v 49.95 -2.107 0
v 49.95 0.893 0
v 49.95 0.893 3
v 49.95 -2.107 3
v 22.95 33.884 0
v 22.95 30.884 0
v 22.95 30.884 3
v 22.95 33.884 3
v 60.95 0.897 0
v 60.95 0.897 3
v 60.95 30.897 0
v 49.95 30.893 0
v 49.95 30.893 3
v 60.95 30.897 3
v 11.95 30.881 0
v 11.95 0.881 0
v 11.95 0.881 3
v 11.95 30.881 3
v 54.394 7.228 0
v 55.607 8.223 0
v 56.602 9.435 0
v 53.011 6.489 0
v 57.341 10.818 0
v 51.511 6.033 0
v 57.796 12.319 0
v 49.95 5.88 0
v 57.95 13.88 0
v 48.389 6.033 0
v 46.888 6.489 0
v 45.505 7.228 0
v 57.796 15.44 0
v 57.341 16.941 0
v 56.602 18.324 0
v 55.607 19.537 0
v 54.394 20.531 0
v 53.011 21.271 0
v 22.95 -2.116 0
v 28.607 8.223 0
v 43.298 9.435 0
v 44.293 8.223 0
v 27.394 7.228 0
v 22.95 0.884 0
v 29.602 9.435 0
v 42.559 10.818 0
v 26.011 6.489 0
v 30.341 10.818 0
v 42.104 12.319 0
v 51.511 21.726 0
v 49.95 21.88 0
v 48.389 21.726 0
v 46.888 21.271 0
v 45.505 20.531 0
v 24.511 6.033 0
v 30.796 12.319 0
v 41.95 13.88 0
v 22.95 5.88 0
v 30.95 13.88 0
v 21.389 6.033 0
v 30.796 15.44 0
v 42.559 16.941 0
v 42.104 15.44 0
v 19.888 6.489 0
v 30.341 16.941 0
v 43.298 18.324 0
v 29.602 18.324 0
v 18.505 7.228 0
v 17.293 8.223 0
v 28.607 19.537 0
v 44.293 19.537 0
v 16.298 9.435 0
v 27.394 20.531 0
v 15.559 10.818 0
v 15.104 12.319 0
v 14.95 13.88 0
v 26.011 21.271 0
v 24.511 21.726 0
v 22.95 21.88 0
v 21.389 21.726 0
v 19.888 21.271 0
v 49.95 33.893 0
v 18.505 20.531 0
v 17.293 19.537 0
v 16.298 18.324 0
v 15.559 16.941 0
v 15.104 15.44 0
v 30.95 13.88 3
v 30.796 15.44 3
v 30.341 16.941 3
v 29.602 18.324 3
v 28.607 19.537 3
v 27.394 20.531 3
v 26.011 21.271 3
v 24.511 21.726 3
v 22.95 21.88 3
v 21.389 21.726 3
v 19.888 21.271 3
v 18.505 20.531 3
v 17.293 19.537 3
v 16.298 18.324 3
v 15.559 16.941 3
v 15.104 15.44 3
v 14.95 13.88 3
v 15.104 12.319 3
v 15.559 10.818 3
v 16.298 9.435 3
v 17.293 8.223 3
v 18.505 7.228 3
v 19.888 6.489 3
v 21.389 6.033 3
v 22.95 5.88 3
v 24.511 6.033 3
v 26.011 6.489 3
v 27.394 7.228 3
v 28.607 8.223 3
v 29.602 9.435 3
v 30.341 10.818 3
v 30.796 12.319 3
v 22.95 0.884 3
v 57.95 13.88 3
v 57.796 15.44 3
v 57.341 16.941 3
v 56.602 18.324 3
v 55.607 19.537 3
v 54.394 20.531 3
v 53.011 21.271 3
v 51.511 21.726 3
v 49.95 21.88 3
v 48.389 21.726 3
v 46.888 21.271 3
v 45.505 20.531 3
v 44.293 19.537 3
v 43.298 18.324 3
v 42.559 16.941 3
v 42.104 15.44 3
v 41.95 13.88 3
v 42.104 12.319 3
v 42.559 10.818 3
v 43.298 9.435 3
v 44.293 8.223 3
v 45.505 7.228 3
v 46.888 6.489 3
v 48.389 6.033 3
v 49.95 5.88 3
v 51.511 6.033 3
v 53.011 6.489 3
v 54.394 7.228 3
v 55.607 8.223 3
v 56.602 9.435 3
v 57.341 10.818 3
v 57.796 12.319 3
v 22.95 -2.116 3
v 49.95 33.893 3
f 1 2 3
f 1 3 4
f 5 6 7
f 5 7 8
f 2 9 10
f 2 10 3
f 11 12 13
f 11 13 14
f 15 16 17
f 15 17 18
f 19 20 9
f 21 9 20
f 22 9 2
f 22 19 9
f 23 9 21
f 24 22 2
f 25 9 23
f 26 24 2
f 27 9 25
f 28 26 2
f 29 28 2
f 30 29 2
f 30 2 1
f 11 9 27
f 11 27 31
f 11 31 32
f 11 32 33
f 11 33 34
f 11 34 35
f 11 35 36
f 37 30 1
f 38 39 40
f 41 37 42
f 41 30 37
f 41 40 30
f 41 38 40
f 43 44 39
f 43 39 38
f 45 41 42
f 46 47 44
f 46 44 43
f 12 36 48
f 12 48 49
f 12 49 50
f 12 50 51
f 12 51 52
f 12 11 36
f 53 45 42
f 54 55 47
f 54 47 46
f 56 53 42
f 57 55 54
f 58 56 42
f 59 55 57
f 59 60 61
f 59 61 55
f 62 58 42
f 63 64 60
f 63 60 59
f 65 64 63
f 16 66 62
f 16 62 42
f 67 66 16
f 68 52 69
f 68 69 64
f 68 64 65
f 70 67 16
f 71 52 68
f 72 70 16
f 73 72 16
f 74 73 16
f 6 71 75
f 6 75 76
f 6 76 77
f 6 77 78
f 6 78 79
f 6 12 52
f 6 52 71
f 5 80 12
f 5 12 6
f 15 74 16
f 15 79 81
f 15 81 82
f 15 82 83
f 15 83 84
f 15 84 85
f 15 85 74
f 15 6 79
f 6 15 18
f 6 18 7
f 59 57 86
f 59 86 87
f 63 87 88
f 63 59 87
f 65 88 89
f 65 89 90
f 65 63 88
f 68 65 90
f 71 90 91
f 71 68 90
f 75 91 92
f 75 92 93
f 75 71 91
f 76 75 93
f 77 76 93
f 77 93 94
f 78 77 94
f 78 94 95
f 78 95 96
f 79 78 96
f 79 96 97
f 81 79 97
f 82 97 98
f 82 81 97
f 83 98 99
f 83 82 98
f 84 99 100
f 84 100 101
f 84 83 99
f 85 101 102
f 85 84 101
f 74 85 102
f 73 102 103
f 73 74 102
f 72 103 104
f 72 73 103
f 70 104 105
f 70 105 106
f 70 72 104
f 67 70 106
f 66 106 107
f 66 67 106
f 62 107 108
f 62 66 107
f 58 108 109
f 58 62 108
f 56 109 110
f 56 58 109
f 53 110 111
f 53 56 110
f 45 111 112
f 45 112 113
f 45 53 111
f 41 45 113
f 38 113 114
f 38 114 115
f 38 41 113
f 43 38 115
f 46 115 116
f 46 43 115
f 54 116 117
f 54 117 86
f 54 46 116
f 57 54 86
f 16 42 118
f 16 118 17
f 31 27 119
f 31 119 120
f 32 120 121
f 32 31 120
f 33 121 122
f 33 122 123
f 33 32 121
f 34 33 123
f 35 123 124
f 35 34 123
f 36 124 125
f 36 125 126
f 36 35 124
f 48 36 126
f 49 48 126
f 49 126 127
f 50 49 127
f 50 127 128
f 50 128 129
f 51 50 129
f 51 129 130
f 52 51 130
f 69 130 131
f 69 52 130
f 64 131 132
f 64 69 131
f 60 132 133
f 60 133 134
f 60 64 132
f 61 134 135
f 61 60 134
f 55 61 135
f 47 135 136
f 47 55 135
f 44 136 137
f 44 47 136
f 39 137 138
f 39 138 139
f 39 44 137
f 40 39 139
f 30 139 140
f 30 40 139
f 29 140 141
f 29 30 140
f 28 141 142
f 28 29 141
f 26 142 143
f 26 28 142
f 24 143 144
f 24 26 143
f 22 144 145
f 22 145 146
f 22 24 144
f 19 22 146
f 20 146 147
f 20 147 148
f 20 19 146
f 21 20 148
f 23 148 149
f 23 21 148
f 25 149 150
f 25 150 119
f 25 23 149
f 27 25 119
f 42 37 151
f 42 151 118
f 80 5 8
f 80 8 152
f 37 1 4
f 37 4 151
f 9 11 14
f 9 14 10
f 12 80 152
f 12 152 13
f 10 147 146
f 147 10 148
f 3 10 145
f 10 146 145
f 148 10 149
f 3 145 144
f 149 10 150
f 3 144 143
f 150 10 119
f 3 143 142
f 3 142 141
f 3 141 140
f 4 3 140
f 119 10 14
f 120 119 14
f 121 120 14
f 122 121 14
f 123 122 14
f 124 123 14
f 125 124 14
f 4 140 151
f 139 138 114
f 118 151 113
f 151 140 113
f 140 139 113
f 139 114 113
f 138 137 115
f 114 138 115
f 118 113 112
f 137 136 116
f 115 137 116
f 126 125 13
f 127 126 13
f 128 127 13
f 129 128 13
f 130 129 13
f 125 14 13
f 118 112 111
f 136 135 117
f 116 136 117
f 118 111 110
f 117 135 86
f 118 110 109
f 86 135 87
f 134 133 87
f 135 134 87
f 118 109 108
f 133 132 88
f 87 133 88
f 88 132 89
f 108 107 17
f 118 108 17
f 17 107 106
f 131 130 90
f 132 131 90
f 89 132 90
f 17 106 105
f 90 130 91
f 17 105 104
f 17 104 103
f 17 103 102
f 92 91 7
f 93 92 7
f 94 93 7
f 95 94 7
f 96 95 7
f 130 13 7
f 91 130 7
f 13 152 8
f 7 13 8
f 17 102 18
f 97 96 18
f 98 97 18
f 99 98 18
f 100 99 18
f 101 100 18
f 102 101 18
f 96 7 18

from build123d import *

# Parameters (mm, degrees)
MODEL_R             = 8
BOSS_EXTRUDE1_DEPTH = 3


with BuildPart() as part:
    # Model → Boss-Extrude1 (new body)
    with BuildSketch(Plane.XY):
        Polygon((11.949818483, 0.880696589), (11.949818483, 30.880698285), (22.949818483, 30.884397455), (22.949818483, 33.884397625), (49.949818483, 33.893477406), (49.949818483, 30.893477236), (60.949818483, 30.897176406), (60.949818483, 0.89717471), (49.949818483, 0.89347554), (49.949818483, -2.10652463), (22.949818483, -2.115604411), (22.949818483, 0.884395759), align=None)
        with Locations((22.949818483, 13.879651404)):
            Circle(MODEL_R, mode=Mode.SUBTRACT)
        with Locations((49.949818483, 13.879651404)):
            Circle(MODEL_R, mode=Mode.SUBTRACT)
    extrude(amount=BOSS_EXTRUDE1_DEPTH)


solid = part.part
